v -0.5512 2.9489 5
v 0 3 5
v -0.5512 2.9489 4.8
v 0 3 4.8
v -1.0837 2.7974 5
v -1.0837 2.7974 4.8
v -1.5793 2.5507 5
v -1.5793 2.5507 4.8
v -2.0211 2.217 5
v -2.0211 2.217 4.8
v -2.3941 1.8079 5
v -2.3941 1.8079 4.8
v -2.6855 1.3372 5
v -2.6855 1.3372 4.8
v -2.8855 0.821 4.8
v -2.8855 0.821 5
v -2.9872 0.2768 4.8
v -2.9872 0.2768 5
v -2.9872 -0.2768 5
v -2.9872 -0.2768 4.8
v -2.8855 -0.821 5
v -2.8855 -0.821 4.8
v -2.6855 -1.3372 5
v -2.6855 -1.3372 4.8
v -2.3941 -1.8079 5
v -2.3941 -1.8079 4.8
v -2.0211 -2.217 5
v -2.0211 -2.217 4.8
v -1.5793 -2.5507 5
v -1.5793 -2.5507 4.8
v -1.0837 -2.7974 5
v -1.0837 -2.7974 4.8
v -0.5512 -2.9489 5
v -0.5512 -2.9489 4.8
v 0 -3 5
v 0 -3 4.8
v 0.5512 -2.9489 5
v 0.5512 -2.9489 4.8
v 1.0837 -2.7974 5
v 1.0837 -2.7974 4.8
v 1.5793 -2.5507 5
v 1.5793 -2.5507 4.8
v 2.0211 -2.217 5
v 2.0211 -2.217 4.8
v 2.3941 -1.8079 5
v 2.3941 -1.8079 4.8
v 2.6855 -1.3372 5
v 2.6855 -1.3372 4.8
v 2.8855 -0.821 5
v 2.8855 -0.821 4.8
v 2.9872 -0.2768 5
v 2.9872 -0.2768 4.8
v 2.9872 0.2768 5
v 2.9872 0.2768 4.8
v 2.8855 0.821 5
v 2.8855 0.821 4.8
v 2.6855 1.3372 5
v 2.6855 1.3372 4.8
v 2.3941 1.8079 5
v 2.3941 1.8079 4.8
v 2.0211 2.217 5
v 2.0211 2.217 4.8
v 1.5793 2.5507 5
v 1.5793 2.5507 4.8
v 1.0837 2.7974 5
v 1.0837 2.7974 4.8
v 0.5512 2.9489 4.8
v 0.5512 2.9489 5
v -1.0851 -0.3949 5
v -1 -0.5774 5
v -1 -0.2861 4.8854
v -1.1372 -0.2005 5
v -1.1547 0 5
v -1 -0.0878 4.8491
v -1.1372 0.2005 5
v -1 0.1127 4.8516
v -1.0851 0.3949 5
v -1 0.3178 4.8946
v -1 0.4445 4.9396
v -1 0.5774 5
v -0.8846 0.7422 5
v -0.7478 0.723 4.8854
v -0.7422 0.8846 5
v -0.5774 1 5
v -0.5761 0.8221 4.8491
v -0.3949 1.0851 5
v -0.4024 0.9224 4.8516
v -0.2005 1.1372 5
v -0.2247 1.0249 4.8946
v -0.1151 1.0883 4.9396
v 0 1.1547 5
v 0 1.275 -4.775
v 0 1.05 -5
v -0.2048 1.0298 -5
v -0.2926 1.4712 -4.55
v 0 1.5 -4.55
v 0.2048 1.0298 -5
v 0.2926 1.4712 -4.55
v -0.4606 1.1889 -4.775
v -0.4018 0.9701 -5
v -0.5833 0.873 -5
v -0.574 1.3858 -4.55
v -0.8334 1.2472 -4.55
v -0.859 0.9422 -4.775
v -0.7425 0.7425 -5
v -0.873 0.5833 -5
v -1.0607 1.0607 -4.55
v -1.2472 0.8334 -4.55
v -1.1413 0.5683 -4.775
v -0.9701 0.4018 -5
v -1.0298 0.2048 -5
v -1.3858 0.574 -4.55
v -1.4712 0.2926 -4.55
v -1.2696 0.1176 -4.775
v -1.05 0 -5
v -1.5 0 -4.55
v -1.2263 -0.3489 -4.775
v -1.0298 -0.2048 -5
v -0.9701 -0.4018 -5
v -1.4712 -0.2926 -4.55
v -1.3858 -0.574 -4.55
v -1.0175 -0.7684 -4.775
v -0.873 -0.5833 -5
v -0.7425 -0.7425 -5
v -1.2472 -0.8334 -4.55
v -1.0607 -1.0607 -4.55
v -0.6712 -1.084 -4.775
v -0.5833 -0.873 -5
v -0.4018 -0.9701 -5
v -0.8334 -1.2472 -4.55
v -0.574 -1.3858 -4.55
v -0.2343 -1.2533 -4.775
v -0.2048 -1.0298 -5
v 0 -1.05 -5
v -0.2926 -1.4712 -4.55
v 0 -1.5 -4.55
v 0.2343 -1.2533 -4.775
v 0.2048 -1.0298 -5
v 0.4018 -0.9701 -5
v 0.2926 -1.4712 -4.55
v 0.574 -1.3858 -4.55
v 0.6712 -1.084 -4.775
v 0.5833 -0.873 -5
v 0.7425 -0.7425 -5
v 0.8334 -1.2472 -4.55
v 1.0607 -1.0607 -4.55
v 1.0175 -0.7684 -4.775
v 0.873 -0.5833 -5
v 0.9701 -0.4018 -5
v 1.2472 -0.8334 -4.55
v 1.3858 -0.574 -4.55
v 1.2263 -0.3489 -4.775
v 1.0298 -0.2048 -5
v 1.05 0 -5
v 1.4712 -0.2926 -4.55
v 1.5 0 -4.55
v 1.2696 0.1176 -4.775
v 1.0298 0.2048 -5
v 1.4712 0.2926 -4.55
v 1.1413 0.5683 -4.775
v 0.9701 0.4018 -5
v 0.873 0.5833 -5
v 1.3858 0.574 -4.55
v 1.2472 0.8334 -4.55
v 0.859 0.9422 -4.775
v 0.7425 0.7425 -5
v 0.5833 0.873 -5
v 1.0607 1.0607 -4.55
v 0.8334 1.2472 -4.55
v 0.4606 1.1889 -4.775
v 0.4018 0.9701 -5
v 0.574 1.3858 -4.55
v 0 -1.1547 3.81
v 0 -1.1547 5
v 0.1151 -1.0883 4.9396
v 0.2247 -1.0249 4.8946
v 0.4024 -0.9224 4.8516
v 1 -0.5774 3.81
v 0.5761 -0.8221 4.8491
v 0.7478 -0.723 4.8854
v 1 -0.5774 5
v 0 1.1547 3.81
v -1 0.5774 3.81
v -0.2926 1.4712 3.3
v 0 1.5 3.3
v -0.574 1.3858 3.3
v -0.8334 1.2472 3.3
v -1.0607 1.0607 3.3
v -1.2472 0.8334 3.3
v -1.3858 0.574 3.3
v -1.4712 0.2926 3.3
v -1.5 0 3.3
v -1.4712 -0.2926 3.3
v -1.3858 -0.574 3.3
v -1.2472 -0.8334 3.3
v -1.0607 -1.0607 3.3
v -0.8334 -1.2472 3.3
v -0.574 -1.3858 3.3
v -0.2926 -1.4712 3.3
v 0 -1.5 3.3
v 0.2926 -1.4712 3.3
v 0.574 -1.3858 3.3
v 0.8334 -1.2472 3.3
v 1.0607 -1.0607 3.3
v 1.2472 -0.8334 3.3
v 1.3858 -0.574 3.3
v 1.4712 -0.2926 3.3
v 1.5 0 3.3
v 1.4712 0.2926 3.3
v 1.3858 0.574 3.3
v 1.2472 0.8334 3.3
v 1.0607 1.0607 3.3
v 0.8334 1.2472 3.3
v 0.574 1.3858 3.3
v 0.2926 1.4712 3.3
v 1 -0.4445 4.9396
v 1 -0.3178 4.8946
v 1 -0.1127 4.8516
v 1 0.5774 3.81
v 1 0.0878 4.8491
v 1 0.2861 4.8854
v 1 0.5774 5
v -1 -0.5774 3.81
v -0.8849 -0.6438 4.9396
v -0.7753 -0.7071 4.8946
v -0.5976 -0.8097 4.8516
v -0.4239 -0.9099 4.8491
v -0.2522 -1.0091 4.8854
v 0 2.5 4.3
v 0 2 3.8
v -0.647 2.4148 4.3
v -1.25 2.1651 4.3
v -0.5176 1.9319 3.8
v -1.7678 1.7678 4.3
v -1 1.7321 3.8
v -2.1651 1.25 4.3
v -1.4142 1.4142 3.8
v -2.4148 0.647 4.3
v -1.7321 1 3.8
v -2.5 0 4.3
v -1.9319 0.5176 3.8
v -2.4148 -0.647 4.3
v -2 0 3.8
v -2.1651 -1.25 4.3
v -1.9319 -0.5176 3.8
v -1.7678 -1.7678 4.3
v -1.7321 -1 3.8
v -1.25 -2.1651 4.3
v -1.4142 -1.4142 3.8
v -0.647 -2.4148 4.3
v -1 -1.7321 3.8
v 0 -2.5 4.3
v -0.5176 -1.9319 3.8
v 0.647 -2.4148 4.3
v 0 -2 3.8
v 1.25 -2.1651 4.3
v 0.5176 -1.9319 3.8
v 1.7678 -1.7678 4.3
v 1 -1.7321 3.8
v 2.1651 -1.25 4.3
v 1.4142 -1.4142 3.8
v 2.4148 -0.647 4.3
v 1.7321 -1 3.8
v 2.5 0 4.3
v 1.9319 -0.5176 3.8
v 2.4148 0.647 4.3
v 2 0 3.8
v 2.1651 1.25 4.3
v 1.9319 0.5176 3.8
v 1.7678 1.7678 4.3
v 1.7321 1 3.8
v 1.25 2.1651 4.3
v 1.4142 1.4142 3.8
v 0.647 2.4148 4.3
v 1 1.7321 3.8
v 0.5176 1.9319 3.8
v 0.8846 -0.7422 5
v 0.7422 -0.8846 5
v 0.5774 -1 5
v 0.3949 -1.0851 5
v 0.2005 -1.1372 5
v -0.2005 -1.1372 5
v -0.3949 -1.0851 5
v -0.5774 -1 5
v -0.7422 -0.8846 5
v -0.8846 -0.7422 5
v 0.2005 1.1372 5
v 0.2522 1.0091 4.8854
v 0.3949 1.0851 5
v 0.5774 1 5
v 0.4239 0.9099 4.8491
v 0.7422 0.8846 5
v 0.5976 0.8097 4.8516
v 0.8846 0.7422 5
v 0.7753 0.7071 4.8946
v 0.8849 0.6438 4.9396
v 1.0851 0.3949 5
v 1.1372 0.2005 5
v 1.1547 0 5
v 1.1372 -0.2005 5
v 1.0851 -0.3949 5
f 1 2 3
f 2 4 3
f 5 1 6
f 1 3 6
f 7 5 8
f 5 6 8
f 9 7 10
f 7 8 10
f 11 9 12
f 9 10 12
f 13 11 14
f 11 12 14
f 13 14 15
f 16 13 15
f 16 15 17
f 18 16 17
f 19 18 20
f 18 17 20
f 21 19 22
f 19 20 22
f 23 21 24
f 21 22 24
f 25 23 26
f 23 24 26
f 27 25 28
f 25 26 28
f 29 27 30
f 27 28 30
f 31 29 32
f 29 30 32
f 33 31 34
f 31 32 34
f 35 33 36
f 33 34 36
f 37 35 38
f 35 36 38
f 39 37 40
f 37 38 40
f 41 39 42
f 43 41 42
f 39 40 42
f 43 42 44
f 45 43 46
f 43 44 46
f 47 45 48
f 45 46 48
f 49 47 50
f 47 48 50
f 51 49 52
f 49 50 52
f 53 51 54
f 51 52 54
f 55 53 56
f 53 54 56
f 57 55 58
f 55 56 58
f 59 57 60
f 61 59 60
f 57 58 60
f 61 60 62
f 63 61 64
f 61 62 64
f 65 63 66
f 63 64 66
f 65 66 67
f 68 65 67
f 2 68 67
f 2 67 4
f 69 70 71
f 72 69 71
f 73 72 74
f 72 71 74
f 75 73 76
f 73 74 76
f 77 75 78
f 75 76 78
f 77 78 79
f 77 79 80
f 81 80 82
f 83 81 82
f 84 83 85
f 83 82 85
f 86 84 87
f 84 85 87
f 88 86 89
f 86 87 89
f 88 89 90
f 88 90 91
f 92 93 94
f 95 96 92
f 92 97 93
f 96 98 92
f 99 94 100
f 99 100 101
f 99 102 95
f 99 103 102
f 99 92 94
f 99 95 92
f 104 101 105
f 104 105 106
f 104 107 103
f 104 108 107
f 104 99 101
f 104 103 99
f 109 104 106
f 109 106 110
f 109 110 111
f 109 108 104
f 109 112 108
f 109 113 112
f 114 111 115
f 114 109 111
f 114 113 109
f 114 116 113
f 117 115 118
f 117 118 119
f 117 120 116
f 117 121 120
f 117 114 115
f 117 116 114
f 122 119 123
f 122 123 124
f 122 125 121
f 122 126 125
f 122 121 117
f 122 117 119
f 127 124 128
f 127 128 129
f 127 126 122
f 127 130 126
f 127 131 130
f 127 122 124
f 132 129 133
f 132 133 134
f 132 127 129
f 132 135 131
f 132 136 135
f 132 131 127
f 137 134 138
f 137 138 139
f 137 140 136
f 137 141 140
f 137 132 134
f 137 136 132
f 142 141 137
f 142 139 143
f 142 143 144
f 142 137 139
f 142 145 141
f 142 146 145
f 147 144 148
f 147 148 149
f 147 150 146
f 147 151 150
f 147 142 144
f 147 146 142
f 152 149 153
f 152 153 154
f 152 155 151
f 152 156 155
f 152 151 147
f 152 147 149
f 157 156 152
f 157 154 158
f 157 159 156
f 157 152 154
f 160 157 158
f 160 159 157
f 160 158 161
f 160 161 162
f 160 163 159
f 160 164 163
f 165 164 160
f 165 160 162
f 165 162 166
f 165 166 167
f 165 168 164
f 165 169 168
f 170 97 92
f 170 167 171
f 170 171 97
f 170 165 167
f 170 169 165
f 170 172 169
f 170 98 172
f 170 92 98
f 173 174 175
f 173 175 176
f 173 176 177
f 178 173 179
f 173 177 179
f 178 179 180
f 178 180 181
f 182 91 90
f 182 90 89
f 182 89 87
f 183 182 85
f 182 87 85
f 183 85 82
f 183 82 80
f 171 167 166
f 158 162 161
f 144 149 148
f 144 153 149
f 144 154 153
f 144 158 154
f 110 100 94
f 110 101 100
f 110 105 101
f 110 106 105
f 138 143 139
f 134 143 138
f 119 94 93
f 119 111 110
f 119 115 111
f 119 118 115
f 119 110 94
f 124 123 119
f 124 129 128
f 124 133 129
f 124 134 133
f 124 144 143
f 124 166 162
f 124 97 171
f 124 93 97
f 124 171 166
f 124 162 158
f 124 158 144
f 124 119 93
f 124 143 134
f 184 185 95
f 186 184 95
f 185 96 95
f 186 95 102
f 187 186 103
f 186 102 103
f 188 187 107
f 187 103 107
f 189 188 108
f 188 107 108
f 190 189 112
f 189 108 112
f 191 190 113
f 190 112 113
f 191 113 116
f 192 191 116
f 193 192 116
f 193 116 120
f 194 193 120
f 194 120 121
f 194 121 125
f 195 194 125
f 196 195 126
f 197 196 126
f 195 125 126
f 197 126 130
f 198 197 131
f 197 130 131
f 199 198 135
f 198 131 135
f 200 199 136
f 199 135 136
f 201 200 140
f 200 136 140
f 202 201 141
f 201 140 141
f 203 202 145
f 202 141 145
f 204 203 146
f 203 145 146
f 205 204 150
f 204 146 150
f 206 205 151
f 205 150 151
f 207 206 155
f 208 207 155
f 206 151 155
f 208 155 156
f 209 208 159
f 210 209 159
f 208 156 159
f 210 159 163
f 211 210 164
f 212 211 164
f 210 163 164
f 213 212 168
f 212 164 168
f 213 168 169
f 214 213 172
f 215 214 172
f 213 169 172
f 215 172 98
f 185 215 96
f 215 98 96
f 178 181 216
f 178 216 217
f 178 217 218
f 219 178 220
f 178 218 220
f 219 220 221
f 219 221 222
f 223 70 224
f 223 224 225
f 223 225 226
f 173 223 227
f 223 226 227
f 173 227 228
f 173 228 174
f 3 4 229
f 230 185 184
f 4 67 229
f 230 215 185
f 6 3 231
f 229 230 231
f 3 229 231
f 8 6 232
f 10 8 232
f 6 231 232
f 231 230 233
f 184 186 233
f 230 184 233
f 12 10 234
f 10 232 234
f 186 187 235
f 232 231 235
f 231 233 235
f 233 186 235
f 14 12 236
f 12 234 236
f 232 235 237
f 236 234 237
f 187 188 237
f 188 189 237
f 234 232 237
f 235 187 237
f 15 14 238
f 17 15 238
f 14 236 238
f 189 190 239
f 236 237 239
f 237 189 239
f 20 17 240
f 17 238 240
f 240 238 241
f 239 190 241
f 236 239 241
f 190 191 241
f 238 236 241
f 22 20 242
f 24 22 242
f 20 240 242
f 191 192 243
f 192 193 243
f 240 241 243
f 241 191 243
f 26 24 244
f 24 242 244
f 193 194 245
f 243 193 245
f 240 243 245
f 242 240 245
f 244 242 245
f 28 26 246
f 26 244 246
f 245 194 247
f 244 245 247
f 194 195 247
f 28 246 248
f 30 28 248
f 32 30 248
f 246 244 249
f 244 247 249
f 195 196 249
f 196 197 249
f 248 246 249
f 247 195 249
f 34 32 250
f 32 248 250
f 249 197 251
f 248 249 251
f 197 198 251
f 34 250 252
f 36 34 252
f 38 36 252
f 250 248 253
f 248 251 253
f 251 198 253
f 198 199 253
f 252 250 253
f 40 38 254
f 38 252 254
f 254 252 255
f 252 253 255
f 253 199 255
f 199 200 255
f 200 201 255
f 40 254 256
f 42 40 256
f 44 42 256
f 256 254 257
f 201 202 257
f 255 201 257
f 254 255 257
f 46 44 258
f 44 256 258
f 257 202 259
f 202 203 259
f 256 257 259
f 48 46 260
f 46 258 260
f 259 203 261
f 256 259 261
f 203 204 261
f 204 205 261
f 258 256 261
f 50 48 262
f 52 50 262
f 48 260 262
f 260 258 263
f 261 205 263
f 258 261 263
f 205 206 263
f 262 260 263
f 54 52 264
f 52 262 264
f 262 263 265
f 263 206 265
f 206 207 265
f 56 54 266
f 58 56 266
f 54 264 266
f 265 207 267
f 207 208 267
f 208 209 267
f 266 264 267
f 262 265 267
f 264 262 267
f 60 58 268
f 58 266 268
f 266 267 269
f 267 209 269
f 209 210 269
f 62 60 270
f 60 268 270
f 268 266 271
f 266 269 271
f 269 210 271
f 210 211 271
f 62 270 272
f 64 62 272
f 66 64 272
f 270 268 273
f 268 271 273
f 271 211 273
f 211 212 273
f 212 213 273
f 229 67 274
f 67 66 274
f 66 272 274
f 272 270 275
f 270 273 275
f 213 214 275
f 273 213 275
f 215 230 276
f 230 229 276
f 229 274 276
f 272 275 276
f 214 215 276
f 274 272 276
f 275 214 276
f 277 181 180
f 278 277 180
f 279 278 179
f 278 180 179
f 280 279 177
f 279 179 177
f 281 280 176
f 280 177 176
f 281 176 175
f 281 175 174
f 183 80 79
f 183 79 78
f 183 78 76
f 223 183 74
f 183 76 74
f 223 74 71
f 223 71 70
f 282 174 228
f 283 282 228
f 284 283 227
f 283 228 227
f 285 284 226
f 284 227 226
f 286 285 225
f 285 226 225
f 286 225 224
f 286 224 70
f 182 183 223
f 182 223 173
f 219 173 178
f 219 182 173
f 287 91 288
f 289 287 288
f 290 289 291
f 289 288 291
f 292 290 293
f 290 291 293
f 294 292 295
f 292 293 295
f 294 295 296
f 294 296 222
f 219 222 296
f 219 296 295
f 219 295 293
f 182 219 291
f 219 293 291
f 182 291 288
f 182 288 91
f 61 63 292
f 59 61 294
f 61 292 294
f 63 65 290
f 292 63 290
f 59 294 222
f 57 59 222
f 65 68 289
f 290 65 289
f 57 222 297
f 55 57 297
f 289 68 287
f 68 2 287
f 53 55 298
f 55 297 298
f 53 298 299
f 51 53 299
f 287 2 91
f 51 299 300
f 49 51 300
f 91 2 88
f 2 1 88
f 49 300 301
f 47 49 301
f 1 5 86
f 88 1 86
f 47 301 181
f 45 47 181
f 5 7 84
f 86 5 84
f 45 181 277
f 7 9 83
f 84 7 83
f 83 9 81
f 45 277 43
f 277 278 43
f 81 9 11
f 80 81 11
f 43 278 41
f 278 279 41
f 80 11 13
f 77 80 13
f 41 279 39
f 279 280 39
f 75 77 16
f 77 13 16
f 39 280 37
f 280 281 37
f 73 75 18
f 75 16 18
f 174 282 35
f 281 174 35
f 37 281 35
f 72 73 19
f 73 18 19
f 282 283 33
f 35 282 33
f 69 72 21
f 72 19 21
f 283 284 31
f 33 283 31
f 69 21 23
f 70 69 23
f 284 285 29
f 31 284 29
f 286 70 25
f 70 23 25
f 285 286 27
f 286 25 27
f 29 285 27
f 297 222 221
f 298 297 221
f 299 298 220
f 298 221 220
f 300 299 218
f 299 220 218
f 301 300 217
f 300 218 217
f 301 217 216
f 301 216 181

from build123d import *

# Parameters (mm, degrees)
SKETCH3_W          = 10
SKETCH3_H          = 1.5
CHAMFER1_SIZE      = 0.45
CUT_EXTRUDE1_DEPTH = 1.19


with BuildPart() as part:
    # Sketch3 → Revolve1 (revolve)
    with BuildSketch(Plane(origin=(0, 0, 0), x_dir=(0, 0, -1), z_dir=(1, 0, 0))):
        with Locations((0, 0.75)):
            Rectangle(SKETCH3_W, SKETCH3_H)
    revolve(axis=Axis((0, 0, -5), (0, 0, 1)))

    # Chamfer1
    chamfer1_edges = [part.edges().sort_by_distance(p)[0] for p in [
        (0, -1.5, -5),
    ]]
    chamfer(chamfer1_edges, length=CHAMFER1_SIZE)

    # Sketch6 → Revolve2 (revolve)
    with BuildSketch(Plane(origin=(0, 0, 0), x_dir=(0, 0, -1), z_dir=(1, 0, 0))):
        Polygon((-5, 3), (-4.8, 3), (-3.3, 1.5), (-3.3, 0), (-5, 0), align=None)
    revolve(axis=Axis((0, 0, -5), (0, 0, 1)))

    # Sketch8 → Cut-Extrude1 (cut)
    with BuildSketch(Plane.XY.offset(5)):
        Polygon((0, 1.154700538), (-1, 0.577350269), (-1, -0.577350269), (0, -1.154700538), (1, -0.577350269), (1, 0.577350269), align=None)
    extrude(amount=-CUT_EXTRUDE1_DEPTH, mode=Mode.SUBTRACT)

    # Cut-Extrude2 cone 1 section (through the dimple's axis) → Cut-Extrude2 (revolve, cut)
    with BuildSketch(Plane(origin=(0, 0, 5), x_dir=(0, -1, 0), z_dir=(1, 0, 0))):
        Polygon((0, 0), (1.154700538, 0), (0, 1.154700538), align=None)
    revolve(axis=Axis((0, 0, 5), (0, 0, -1)), mode=Mode.SUBTRACT)


solid = part.part
